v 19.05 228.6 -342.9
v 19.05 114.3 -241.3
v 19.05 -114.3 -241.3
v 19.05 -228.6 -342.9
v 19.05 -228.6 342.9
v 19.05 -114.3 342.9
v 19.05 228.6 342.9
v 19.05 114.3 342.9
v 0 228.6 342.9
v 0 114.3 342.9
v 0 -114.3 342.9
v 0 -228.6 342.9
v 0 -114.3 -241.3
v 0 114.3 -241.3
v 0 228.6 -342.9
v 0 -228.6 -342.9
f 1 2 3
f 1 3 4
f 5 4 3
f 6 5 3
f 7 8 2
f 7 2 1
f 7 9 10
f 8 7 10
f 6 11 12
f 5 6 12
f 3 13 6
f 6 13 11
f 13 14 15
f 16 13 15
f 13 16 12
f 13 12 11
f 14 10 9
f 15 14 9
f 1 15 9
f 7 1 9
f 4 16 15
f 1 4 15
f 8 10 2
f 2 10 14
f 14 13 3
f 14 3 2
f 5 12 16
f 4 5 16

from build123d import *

# Parameters (mm, degrees)
F0_W     = 228.6
F0_H     = 101.6
F1_DEPTH = 19.05


with BuildPart() as f1:
    # F0 (on Right) → F1 (new body)
    with BuildSketch(Plane.YZ):
        Polygon((-114.3, -241.3), (-114.3, 342.9), (-228.6, 342.9), (-228.6, -342.9), (-114.3, -342.9), align=None)
        with Locations((0, -292.1)):
            Rectangle(F0_W, F0_H)
        Polygon((228.6, -342.9), (228.6, 342.9), (114.3, 342.9), (114.3, -241.3), (114.3, -342.9), align=None)
    extrude(amount=F1_DEPTH)


solid = f1.part
